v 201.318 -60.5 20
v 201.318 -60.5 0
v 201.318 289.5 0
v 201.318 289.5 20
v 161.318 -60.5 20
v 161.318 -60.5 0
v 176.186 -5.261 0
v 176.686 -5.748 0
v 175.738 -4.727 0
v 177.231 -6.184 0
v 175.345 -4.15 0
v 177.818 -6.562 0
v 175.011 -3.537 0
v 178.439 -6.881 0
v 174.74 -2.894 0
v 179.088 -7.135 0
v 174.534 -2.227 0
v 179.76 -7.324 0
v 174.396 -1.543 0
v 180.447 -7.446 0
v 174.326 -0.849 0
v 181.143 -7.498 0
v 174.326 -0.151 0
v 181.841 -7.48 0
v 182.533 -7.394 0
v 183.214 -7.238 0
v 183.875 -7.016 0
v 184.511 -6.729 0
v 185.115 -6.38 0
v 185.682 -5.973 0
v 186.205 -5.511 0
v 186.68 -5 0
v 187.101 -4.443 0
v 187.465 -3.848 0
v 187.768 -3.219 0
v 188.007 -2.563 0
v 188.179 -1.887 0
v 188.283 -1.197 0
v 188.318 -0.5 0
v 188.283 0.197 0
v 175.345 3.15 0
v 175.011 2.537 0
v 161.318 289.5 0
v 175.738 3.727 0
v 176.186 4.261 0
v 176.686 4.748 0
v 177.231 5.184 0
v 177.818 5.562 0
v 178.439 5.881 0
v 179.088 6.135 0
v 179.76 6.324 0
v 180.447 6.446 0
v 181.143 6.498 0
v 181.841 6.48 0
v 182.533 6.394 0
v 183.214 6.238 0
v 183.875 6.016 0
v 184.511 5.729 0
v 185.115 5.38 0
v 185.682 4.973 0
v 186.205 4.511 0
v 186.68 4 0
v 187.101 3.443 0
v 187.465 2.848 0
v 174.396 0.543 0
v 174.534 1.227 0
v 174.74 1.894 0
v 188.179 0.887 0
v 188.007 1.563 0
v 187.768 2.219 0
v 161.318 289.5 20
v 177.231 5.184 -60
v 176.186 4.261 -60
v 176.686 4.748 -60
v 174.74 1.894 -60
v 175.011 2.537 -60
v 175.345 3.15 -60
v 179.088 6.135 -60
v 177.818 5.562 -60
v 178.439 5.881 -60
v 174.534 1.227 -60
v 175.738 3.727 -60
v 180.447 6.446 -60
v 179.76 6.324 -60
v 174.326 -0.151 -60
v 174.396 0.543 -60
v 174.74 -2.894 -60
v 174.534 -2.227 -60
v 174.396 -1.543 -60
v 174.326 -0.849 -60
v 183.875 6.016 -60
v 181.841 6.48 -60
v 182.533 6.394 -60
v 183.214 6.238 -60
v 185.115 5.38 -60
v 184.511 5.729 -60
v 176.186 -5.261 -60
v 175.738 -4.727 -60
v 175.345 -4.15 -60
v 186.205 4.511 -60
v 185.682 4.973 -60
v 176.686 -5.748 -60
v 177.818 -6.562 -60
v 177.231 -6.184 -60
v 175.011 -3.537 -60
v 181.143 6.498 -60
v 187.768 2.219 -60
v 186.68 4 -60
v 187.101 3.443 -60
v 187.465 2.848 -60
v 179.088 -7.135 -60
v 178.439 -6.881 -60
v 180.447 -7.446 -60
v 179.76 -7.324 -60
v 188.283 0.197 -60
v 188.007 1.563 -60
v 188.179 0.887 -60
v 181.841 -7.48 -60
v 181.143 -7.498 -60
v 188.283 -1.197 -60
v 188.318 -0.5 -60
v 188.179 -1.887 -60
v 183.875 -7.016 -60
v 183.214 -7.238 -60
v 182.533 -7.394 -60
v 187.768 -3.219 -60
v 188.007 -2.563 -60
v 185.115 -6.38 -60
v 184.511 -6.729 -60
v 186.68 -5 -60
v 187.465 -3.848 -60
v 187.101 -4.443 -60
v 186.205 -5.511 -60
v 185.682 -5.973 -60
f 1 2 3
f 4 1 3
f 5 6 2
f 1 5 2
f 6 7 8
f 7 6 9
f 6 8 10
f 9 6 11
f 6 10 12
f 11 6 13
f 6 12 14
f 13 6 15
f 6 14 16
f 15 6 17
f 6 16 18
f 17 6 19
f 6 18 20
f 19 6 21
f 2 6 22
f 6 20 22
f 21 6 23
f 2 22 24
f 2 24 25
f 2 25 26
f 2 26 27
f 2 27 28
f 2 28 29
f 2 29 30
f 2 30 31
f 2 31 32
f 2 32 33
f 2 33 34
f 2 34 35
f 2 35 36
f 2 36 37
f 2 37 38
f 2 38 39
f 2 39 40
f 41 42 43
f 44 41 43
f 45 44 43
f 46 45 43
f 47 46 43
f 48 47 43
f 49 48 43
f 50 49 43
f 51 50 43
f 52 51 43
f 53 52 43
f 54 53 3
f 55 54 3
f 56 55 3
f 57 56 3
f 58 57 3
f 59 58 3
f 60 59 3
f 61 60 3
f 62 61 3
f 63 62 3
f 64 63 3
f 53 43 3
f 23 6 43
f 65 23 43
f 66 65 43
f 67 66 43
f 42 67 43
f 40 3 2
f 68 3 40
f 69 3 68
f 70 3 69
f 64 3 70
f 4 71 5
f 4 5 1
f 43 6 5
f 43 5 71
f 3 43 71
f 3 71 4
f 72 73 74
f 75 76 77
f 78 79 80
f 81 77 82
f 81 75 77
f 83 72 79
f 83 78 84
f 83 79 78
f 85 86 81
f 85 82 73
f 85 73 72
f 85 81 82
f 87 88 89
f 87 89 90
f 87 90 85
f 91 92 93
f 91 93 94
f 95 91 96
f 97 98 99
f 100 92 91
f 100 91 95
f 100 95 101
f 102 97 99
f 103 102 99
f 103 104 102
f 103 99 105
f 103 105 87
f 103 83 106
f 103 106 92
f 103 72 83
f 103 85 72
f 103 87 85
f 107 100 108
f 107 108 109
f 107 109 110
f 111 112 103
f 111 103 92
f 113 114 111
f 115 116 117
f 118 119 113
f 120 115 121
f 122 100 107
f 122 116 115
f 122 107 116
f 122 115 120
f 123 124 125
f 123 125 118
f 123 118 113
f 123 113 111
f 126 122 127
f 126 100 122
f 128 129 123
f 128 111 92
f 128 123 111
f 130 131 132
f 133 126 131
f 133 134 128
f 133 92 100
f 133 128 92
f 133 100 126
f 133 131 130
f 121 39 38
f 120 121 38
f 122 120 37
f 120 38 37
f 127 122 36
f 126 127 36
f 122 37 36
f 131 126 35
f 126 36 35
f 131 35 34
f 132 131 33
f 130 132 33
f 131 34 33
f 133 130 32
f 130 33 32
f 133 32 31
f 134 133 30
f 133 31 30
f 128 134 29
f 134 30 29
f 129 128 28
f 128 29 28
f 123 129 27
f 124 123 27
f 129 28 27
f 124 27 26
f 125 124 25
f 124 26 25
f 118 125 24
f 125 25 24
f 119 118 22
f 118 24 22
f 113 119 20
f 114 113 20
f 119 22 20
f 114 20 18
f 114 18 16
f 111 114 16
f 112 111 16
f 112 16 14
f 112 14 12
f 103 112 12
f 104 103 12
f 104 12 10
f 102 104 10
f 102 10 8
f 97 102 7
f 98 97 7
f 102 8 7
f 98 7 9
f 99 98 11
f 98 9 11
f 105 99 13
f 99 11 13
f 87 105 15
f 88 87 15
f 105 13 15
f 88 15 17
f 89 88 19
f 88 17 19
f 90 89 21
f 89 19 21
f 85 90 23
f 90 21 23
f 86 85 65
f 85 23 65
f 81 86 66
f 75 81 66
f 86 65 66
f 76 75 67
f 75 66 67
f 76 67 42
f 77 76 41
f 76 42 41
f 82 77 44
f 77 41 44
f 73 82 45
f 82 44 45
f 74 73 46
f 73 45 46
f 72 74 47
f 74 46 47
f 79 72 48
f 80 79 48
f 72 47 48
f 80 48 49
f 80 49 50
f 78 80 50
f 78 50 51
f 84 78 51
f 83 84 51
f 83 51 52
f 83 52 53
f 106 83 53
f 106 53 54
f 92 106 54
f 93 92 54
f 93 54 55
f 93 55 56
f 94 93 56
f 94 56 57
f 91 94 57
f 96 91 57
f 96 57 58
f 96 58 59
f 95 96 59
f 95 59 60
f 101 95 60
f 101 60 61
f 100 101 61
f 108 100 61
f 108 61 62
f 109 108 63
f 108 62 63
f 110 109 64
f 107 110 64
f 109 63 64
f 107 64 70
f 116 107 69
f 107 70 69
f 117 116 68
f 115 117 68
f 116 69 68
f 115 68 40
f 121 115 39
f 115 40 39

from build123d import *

# Parameters (mm, degrees)
SKETCH1_W      = 40
SKETCH1_H      = 350
EXTRUDE1_DEPTH = 20
SKETCH2_R      = 7
EXTRUDE2_DEPTH = 60


with BuildPart() as part:
    # Sketch1 → Extrude1 (new body)
    with BuildSketch(Plane.XY):
        with Locations((181.317621291, 114.5)):
            Rectangle(SKETCH1_W, SKETCH1_H)
    extrude(amount=EXTRUDE1_DEPTH)

    # Sketch2 → Extrude2 (add)
    with BuildSketch(Plane(origin=(0, 0, 0), x_dir=(-1, 0, 0), z_dir=(0, 0, -1))):
        with Locations(Location((-181.317621291, -0.5, 0), (0, 0, 180))):
            Circle(SKETCH2_R)
    extrude(amount=EXTRUDE2_DEPTH)


solid = part.part
